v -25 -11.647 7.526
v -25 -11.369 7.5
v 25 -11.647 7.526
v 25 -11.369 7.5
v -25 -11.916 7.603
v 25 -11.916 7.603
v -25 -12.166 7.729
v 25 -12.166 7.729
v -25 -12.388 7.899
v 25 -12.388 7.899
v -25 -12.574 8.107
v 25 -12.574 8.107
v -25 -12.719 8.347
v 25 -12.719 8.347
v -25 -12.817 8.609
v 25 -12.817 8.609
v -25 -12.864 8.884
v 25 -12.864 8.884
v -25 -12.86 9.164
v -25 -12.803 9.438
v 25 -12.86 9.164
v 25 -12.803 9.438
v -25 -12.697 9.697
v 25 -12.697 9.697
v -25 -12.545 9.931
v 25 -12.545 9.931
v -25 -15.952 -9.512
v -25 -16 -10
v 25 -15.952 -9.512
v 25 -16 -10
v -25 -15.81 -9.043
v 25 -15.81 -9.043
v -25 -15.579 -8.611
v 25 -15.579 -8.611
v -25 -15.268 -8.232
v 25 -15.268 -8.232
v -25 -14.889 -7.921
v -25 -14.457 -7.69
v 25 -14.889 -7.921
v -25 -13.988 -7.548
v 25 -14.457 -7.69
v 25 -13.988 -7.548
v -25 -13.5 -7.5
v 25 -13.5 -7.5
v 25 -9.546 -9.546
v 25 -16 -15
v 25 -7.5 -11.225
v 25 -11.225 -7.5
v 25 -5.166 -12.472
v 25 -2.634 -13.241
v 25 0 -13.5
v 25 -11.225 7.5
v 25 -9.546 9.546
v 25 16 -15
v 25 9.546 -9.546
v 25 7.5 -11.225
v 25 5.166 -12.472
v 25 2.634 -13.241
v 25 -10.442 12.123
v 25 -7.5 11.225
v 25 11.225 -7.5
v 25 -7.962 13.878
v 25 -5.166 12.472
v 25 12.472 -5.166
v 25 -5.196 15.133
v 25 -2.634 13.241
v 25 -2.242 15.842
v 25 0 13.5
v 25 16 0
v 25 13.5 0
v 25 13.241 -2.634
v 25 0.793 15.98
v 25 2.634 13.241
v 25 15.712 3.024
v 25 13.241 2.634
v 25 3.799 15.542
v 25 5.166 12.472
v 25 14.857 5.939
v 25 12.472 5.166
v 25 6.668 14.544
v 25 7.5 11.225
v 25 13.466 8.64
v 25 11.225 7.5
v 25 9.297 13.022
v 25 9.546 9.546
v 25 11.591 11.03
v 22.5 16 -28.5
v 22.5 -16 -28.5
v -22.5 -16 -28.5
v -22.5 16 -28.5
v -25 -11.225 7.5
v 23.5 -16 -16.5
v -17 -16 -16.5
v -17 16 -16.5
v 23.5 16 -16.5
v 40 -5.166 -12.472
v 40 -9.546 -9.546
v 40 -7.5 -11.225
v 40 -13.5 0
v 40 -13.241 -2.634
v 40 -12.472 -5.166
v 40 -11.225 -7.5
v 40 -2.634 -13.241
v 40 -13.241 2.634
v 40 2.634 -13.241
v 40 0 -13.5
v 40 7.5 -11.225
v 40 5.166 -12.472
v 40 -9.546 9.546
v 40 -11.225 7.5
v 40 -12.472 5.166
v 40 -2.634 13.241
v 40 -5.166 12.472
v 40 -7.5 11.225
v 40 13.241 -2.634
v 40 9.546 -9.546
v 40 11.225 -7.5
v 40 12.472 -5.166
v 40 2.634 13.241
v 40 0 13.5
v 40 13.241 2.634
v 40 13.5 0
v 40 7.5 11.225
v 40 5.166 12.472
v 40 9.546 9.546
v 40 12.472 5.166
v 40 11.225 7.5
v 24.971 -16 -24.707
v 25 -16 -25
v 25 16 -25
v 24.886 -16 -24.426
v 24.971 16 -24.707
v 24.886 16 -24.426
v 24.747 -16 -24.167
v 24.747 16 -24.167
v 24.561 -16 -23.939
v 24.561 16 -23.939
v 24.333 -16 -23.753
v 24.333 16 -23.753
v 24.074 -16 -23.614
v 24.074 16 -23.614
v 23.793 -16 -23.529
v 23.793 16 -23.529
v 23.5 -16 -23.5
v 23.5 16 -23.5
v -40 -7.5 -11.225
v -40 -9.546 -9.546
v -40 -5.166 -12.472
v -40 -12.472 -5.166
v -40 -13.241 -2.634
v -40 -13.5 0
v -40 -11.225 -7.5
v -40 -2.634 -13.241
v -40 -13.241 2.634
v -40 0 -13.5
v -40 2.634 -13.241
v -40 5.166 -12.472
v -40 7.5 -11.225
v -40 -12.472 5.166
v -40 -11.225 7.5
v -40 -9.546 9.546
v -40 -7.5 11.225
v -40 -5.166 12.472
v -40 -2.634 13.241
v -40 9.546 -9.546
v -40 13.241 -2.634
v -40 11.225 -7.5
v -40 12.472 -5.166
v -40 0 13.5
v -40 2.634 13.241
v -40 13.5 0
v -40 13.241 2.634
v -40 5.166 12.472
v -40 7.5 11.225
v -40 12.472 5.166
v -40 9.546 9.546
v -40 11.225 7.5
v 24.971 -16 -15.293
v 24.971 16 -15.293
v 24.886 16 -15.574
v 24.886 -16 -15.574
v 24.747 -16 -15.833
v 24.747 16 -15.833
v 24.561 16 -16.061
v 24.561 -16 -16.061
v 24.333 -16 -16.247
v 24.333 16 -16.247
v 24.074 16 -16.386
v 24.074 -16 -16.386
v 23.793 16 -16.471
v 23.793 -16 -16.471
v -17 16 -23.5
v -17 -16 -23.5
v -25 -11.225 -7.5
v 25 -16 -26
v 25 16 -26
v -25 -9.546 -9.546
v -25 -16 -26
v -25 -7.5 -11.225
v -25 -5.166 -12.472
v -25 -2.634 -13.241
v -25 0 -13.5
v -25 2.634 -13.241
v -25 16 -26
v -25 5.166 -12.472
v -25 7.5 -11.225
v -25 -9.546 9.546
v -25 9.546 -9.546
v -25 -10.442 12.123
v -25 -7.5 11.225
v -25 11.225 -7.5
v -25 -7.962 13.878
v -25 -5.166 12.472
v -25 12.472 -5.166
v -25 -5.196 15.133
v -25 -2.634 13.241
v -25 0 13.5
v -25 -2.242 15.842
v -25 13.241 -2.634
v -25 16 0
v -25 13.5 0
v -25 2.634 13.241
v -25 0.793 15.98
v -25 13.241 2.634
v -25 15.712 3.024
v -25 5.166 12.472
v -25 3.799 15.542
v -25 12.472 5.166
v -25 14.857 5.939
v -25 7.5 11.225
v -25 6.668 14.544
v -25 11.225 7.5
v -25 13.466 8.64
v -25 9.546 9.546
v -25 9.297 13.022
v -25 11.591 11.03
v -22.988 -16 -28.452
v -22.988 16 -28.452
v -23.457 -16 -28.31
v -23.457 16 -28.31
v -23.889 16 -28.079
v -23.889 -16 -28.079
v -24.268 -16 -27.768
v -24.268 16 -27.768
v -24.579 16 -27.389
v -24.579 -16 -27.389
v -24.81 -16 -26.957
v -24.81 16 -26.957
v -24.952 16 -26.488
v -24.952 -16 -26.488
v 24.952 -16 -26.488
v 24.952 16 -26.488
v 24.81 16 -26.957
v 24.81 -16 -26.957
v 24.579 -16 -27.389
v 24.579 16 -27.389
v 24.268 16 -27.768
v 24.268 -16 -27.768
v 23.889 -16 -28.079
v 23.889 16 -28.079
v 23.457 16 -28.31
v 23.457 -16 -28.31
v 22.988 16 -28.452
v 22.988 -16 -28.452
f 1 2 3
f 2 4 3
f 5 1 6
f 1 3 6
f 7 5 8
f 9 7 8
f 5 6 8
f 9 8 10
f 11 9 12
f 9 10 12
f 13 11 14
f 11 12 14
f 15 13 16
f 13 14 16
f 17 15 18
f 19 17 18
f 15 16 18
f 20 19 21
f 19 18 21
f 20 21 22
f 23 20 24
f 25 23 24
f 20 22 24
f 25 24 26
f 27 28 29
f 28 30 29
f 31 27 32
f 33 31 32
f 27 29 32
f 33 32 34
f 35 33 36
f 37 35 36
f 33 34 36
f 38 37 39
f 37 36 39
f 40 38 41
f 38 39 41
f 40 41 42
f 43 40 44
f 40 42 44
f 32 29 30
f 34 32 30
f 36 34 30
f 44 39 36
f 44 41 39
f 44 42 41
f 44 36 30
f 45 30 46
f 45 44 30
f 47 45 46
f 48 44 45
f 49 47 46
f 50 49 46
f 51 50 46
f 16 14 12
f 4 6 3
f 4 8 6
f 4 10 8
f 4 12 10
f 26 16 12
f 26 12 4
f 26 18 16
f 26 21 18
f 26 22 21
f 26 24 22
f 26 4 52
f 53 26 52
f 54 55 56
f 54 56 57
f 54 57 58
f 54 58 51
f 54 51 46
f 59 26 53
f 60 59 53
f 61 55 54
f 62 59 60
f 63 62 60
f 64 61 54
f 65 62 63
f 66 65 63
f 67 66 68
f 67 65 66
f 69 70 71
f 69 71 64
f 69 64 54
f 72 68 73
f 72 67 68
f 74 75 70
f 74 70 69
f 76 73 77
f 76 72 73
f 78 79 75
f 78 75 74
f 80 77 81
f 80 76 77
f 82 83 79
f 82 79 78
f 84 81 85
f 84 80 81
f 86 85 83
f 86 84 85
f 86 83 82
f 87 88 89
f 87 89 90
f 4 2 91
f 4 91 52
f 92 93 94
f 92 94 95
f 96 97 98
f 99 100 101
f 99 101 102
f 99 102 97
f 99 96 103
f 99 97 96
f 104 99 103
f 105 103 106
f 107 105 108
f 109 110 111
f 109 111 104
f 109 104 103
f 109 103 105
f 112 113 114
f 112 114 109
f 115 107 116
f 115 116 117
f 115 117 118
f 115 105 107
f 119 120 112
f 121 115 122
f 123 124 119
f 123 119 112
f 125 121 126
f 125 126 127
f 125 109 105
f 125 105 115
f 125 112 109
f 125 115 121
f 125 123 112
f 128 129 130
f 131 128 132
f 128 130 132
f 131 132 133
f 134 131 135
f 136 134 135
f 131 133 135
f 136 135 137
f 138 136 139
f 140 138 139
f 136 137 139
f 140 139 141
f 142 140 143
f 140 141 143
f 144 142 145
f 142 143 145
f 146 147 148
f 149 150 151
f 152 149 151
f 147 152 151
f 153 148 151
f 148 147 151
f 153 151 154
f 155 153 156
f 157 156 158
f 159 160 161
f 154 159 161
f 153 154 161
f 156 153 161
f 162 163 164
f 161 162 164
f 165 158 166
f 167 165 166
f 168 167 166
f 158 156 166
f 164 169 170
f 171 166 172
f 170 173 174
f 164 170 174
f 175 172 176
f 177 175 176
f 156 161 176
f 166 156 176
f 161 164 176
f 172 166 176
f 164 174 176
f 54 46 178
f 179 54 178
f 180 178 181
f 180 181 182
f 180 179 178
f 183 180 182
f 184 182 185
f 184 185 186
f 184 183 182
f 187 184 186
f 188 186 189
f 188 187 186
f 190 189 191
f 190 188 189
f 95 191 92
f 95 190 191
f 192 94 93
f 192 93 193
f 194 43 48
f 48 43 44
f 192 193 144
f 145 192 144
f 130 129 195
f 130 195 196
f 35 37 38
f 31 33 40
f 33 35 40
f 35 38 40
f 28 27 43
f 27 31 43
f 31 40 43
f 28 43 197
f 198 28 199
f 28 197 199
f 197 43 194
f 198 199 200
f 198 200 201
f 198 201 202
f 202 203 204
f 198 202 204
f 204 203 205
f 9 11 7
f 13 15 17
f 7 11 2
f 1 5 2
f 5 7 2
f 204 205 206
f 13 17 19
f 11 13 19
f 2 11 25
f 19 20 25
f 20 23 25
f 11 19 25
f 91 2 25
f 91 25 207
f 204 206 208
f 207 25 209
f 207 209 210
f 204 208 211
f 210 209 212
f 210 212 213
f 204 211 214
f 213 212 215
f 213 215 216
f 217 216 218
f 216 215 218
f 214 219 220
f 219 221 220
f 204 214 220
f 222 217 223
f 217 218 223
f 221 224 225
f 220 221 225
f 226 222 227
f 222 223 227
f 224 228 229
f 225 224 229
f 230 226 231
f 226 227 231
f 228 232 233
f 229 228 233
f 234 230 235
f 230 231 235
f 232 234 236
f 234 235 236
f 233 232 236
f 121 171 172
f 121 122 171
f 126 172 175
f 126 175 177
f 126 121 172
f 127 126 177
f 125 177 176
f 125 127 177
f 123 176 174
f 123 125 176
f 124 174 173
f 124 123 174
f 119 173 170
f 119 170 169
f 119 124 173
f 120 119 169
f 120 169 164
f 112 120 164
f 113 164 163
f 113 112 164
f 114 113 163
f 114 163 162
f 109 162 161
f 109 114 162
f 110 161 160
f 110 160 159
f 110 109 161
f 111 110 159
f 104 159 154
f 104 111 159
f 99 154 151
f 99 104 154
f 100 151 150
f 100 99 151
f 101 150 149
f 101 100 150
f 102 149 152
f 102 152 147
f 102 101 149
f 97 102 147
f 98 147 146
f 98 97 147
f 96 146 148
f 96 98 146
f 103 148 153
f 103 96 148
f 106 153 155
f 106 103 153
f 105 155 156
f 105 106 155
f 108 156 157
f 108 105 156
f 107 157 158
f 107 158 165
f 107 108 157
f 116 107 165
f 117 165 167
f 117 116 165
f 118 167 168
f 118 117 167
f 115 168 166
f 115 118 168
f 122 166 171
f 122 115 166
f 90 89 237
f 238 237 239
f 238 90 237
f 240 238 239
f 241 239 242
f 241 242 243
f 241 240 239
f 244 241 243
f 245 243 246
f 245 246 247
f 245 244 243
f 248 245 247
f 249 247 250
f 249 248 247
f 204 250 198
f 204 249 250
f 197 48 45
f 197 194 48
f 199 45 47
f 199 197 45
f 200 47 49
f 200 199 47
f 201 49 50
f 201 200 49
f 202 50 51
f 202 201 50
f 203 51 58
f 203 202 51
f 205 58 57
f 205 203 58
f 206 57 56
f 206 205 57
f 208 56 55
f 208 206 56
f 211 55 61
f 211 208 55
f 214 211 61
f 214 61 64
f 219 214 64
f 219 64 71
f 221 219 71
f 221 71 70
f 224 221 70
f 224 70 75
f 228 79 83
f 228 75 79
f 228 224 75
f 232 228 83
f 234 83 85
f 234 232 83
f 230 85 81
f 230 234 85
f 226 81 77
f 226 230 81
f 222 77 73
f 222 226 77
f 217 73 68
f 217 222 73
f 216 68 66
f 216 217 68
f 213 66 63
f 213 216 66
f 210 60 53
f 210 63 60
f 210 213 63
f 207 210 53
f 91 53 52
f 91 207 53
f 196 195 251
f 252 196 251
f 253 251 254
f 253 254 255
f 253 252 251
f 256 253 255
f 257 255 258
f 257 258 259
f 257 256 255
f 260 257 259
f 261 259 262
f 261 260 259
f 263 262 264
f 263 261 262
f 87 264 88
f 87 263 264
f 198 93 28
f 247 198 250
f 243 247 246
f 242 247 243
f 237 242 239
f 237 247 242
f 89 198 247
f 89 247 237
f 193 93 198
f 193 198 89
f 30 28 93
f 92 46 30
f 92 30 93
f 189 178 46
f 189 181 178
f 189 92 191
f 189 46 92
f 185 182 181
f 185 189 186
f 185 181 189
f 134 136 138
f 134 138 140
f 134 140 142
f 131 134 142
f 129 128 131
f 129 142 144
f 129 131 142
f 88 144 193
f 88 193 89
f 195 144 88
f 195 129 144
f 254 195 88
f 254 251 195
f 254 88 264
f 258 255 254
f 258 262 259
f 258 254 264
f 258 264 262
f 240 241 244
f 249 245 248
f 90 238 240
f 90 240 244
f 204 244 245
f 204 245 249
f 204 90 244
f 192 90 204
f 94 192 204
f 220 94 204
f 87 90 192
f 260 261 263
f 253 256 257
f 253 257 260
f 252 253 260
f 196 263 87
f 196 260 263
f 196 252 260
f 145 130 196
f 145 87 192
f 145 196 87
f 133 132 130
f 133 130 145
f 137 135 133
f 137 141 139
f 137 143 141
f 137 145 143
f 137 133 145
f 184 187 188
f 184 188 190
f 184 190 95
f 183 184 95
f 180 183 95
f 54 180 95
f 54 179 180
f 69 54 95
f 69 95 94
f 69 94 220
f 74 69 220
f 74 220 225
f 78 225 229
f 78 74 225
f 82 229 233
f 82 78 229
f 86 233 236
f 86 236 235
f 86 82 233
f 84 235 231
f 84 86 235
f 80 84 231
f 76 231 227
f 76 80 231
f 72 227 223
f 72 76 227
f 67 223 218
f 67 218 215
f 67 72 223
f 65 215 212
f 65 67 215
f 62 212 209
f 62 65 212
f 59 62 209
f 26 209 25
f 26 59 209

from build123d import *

# Parameters (mm, degrees)
SKETCH_R        = 13.5
PAD_DEPTH       = 40
SKETCH001_R     = 13.5
PAD001_DEPTH    = 25
SKETCH002_W     = 7
SKETCH002_H     = 42
POCKET_DEPTH    = 32
SKETCH003_W     = 15
SKETCH003_H     = 50
POCKET001_DEPTH = 5
FILLET_R        = 2.5
FILLET001_R     = 1.5
FILLET002_R     = 1.5
FILLET003_R     = 2.5


with BuildPart() as pipe:
    # Sketch → Pad (new body, symmetric)
    with BuildSketch(Plane.YZ):
        Circle(SKETCH_R)
    extrude(amount=PAD_DEPTH, both=True)


with BuildPart() as webcamholder:
    # Sketch001 → Pad001 (new body, symmetric)
    with BuildSketch(Plane.YZ):
        with BuildLine():
            ThreePointArc((16, 0), (0, 16), (-16, 0))
            Line((-16, 0), (-16, -28.5))
            Line((-16, -28.5), (16, -28.5))
            Line((16, -28.5), (16, 0))
        make_face()
        Circle(SKETCH001_R, mode=Mode.SUBTRACT)
    extrude(amount=PAD001_DEPTH, both=True)

    # Sketch002 (on Face2 of Pad001) → Pocket (cut)
    with BuildSketch(Plane(origin=(0, -16, 0), x_dir=(0, 0, -1), z_dir=(0, -1, 0))):
        with Locations((20, 4)):
            Rectangle(SKETCH002_W, SKETCH002_H)
    extrude(amount=-POCKET_DEPTH, mode=Mode.SUBTRACT)

    # Sketch003 (on Face3 of Pocket) → Pocket001 (cut)
    with BuildSketch(Plane(origin=(0, -16, 0), x_dir=(0, 0, -1), z_dir=(0, -1, 0))):
        Rectangle(SKETCH003_W, SKETCH003_H)
    extrude(amount=-POCKET001_DEPTH, mode=Mode.SUBTRACT)

    # Fillet
    fillet_edges = [webcamholder.edges().sort_by_distance(p)[0] for p in [
        (0, -16, -7.5),
    ]]
    fillet(fillet_edges, radius=FILLET_R)

    # Fillet001
    fillet001_edges = [webcamholder.edges().sort_by_distance(p)[0] for p in [
        (0, -14.133294, 7.5),
    ]]
    fillet(fillet001_edges, radius=FILLET001_R)

    # Fillet002
    fillet002_edges = [webcamholder.edges().sort_by_distance(p)[0] for p in [
        (25, 0, -16.5),
        (25, 0, -23.5),
    ]]
    fillet(fillet002_edges, radius=FILLET002_R)

    # Fillet003
    fillet003_edges = [webcamholder.edges().sort_by_distance(p)[0] for p in [
        (25, 0, -28.5),
        (-25, 0, -28.5),
    ]]
    fillet(fillet003_edges, radius=FILLET003_R)


solid = Compound([pipe.part, webcamholder.part])
